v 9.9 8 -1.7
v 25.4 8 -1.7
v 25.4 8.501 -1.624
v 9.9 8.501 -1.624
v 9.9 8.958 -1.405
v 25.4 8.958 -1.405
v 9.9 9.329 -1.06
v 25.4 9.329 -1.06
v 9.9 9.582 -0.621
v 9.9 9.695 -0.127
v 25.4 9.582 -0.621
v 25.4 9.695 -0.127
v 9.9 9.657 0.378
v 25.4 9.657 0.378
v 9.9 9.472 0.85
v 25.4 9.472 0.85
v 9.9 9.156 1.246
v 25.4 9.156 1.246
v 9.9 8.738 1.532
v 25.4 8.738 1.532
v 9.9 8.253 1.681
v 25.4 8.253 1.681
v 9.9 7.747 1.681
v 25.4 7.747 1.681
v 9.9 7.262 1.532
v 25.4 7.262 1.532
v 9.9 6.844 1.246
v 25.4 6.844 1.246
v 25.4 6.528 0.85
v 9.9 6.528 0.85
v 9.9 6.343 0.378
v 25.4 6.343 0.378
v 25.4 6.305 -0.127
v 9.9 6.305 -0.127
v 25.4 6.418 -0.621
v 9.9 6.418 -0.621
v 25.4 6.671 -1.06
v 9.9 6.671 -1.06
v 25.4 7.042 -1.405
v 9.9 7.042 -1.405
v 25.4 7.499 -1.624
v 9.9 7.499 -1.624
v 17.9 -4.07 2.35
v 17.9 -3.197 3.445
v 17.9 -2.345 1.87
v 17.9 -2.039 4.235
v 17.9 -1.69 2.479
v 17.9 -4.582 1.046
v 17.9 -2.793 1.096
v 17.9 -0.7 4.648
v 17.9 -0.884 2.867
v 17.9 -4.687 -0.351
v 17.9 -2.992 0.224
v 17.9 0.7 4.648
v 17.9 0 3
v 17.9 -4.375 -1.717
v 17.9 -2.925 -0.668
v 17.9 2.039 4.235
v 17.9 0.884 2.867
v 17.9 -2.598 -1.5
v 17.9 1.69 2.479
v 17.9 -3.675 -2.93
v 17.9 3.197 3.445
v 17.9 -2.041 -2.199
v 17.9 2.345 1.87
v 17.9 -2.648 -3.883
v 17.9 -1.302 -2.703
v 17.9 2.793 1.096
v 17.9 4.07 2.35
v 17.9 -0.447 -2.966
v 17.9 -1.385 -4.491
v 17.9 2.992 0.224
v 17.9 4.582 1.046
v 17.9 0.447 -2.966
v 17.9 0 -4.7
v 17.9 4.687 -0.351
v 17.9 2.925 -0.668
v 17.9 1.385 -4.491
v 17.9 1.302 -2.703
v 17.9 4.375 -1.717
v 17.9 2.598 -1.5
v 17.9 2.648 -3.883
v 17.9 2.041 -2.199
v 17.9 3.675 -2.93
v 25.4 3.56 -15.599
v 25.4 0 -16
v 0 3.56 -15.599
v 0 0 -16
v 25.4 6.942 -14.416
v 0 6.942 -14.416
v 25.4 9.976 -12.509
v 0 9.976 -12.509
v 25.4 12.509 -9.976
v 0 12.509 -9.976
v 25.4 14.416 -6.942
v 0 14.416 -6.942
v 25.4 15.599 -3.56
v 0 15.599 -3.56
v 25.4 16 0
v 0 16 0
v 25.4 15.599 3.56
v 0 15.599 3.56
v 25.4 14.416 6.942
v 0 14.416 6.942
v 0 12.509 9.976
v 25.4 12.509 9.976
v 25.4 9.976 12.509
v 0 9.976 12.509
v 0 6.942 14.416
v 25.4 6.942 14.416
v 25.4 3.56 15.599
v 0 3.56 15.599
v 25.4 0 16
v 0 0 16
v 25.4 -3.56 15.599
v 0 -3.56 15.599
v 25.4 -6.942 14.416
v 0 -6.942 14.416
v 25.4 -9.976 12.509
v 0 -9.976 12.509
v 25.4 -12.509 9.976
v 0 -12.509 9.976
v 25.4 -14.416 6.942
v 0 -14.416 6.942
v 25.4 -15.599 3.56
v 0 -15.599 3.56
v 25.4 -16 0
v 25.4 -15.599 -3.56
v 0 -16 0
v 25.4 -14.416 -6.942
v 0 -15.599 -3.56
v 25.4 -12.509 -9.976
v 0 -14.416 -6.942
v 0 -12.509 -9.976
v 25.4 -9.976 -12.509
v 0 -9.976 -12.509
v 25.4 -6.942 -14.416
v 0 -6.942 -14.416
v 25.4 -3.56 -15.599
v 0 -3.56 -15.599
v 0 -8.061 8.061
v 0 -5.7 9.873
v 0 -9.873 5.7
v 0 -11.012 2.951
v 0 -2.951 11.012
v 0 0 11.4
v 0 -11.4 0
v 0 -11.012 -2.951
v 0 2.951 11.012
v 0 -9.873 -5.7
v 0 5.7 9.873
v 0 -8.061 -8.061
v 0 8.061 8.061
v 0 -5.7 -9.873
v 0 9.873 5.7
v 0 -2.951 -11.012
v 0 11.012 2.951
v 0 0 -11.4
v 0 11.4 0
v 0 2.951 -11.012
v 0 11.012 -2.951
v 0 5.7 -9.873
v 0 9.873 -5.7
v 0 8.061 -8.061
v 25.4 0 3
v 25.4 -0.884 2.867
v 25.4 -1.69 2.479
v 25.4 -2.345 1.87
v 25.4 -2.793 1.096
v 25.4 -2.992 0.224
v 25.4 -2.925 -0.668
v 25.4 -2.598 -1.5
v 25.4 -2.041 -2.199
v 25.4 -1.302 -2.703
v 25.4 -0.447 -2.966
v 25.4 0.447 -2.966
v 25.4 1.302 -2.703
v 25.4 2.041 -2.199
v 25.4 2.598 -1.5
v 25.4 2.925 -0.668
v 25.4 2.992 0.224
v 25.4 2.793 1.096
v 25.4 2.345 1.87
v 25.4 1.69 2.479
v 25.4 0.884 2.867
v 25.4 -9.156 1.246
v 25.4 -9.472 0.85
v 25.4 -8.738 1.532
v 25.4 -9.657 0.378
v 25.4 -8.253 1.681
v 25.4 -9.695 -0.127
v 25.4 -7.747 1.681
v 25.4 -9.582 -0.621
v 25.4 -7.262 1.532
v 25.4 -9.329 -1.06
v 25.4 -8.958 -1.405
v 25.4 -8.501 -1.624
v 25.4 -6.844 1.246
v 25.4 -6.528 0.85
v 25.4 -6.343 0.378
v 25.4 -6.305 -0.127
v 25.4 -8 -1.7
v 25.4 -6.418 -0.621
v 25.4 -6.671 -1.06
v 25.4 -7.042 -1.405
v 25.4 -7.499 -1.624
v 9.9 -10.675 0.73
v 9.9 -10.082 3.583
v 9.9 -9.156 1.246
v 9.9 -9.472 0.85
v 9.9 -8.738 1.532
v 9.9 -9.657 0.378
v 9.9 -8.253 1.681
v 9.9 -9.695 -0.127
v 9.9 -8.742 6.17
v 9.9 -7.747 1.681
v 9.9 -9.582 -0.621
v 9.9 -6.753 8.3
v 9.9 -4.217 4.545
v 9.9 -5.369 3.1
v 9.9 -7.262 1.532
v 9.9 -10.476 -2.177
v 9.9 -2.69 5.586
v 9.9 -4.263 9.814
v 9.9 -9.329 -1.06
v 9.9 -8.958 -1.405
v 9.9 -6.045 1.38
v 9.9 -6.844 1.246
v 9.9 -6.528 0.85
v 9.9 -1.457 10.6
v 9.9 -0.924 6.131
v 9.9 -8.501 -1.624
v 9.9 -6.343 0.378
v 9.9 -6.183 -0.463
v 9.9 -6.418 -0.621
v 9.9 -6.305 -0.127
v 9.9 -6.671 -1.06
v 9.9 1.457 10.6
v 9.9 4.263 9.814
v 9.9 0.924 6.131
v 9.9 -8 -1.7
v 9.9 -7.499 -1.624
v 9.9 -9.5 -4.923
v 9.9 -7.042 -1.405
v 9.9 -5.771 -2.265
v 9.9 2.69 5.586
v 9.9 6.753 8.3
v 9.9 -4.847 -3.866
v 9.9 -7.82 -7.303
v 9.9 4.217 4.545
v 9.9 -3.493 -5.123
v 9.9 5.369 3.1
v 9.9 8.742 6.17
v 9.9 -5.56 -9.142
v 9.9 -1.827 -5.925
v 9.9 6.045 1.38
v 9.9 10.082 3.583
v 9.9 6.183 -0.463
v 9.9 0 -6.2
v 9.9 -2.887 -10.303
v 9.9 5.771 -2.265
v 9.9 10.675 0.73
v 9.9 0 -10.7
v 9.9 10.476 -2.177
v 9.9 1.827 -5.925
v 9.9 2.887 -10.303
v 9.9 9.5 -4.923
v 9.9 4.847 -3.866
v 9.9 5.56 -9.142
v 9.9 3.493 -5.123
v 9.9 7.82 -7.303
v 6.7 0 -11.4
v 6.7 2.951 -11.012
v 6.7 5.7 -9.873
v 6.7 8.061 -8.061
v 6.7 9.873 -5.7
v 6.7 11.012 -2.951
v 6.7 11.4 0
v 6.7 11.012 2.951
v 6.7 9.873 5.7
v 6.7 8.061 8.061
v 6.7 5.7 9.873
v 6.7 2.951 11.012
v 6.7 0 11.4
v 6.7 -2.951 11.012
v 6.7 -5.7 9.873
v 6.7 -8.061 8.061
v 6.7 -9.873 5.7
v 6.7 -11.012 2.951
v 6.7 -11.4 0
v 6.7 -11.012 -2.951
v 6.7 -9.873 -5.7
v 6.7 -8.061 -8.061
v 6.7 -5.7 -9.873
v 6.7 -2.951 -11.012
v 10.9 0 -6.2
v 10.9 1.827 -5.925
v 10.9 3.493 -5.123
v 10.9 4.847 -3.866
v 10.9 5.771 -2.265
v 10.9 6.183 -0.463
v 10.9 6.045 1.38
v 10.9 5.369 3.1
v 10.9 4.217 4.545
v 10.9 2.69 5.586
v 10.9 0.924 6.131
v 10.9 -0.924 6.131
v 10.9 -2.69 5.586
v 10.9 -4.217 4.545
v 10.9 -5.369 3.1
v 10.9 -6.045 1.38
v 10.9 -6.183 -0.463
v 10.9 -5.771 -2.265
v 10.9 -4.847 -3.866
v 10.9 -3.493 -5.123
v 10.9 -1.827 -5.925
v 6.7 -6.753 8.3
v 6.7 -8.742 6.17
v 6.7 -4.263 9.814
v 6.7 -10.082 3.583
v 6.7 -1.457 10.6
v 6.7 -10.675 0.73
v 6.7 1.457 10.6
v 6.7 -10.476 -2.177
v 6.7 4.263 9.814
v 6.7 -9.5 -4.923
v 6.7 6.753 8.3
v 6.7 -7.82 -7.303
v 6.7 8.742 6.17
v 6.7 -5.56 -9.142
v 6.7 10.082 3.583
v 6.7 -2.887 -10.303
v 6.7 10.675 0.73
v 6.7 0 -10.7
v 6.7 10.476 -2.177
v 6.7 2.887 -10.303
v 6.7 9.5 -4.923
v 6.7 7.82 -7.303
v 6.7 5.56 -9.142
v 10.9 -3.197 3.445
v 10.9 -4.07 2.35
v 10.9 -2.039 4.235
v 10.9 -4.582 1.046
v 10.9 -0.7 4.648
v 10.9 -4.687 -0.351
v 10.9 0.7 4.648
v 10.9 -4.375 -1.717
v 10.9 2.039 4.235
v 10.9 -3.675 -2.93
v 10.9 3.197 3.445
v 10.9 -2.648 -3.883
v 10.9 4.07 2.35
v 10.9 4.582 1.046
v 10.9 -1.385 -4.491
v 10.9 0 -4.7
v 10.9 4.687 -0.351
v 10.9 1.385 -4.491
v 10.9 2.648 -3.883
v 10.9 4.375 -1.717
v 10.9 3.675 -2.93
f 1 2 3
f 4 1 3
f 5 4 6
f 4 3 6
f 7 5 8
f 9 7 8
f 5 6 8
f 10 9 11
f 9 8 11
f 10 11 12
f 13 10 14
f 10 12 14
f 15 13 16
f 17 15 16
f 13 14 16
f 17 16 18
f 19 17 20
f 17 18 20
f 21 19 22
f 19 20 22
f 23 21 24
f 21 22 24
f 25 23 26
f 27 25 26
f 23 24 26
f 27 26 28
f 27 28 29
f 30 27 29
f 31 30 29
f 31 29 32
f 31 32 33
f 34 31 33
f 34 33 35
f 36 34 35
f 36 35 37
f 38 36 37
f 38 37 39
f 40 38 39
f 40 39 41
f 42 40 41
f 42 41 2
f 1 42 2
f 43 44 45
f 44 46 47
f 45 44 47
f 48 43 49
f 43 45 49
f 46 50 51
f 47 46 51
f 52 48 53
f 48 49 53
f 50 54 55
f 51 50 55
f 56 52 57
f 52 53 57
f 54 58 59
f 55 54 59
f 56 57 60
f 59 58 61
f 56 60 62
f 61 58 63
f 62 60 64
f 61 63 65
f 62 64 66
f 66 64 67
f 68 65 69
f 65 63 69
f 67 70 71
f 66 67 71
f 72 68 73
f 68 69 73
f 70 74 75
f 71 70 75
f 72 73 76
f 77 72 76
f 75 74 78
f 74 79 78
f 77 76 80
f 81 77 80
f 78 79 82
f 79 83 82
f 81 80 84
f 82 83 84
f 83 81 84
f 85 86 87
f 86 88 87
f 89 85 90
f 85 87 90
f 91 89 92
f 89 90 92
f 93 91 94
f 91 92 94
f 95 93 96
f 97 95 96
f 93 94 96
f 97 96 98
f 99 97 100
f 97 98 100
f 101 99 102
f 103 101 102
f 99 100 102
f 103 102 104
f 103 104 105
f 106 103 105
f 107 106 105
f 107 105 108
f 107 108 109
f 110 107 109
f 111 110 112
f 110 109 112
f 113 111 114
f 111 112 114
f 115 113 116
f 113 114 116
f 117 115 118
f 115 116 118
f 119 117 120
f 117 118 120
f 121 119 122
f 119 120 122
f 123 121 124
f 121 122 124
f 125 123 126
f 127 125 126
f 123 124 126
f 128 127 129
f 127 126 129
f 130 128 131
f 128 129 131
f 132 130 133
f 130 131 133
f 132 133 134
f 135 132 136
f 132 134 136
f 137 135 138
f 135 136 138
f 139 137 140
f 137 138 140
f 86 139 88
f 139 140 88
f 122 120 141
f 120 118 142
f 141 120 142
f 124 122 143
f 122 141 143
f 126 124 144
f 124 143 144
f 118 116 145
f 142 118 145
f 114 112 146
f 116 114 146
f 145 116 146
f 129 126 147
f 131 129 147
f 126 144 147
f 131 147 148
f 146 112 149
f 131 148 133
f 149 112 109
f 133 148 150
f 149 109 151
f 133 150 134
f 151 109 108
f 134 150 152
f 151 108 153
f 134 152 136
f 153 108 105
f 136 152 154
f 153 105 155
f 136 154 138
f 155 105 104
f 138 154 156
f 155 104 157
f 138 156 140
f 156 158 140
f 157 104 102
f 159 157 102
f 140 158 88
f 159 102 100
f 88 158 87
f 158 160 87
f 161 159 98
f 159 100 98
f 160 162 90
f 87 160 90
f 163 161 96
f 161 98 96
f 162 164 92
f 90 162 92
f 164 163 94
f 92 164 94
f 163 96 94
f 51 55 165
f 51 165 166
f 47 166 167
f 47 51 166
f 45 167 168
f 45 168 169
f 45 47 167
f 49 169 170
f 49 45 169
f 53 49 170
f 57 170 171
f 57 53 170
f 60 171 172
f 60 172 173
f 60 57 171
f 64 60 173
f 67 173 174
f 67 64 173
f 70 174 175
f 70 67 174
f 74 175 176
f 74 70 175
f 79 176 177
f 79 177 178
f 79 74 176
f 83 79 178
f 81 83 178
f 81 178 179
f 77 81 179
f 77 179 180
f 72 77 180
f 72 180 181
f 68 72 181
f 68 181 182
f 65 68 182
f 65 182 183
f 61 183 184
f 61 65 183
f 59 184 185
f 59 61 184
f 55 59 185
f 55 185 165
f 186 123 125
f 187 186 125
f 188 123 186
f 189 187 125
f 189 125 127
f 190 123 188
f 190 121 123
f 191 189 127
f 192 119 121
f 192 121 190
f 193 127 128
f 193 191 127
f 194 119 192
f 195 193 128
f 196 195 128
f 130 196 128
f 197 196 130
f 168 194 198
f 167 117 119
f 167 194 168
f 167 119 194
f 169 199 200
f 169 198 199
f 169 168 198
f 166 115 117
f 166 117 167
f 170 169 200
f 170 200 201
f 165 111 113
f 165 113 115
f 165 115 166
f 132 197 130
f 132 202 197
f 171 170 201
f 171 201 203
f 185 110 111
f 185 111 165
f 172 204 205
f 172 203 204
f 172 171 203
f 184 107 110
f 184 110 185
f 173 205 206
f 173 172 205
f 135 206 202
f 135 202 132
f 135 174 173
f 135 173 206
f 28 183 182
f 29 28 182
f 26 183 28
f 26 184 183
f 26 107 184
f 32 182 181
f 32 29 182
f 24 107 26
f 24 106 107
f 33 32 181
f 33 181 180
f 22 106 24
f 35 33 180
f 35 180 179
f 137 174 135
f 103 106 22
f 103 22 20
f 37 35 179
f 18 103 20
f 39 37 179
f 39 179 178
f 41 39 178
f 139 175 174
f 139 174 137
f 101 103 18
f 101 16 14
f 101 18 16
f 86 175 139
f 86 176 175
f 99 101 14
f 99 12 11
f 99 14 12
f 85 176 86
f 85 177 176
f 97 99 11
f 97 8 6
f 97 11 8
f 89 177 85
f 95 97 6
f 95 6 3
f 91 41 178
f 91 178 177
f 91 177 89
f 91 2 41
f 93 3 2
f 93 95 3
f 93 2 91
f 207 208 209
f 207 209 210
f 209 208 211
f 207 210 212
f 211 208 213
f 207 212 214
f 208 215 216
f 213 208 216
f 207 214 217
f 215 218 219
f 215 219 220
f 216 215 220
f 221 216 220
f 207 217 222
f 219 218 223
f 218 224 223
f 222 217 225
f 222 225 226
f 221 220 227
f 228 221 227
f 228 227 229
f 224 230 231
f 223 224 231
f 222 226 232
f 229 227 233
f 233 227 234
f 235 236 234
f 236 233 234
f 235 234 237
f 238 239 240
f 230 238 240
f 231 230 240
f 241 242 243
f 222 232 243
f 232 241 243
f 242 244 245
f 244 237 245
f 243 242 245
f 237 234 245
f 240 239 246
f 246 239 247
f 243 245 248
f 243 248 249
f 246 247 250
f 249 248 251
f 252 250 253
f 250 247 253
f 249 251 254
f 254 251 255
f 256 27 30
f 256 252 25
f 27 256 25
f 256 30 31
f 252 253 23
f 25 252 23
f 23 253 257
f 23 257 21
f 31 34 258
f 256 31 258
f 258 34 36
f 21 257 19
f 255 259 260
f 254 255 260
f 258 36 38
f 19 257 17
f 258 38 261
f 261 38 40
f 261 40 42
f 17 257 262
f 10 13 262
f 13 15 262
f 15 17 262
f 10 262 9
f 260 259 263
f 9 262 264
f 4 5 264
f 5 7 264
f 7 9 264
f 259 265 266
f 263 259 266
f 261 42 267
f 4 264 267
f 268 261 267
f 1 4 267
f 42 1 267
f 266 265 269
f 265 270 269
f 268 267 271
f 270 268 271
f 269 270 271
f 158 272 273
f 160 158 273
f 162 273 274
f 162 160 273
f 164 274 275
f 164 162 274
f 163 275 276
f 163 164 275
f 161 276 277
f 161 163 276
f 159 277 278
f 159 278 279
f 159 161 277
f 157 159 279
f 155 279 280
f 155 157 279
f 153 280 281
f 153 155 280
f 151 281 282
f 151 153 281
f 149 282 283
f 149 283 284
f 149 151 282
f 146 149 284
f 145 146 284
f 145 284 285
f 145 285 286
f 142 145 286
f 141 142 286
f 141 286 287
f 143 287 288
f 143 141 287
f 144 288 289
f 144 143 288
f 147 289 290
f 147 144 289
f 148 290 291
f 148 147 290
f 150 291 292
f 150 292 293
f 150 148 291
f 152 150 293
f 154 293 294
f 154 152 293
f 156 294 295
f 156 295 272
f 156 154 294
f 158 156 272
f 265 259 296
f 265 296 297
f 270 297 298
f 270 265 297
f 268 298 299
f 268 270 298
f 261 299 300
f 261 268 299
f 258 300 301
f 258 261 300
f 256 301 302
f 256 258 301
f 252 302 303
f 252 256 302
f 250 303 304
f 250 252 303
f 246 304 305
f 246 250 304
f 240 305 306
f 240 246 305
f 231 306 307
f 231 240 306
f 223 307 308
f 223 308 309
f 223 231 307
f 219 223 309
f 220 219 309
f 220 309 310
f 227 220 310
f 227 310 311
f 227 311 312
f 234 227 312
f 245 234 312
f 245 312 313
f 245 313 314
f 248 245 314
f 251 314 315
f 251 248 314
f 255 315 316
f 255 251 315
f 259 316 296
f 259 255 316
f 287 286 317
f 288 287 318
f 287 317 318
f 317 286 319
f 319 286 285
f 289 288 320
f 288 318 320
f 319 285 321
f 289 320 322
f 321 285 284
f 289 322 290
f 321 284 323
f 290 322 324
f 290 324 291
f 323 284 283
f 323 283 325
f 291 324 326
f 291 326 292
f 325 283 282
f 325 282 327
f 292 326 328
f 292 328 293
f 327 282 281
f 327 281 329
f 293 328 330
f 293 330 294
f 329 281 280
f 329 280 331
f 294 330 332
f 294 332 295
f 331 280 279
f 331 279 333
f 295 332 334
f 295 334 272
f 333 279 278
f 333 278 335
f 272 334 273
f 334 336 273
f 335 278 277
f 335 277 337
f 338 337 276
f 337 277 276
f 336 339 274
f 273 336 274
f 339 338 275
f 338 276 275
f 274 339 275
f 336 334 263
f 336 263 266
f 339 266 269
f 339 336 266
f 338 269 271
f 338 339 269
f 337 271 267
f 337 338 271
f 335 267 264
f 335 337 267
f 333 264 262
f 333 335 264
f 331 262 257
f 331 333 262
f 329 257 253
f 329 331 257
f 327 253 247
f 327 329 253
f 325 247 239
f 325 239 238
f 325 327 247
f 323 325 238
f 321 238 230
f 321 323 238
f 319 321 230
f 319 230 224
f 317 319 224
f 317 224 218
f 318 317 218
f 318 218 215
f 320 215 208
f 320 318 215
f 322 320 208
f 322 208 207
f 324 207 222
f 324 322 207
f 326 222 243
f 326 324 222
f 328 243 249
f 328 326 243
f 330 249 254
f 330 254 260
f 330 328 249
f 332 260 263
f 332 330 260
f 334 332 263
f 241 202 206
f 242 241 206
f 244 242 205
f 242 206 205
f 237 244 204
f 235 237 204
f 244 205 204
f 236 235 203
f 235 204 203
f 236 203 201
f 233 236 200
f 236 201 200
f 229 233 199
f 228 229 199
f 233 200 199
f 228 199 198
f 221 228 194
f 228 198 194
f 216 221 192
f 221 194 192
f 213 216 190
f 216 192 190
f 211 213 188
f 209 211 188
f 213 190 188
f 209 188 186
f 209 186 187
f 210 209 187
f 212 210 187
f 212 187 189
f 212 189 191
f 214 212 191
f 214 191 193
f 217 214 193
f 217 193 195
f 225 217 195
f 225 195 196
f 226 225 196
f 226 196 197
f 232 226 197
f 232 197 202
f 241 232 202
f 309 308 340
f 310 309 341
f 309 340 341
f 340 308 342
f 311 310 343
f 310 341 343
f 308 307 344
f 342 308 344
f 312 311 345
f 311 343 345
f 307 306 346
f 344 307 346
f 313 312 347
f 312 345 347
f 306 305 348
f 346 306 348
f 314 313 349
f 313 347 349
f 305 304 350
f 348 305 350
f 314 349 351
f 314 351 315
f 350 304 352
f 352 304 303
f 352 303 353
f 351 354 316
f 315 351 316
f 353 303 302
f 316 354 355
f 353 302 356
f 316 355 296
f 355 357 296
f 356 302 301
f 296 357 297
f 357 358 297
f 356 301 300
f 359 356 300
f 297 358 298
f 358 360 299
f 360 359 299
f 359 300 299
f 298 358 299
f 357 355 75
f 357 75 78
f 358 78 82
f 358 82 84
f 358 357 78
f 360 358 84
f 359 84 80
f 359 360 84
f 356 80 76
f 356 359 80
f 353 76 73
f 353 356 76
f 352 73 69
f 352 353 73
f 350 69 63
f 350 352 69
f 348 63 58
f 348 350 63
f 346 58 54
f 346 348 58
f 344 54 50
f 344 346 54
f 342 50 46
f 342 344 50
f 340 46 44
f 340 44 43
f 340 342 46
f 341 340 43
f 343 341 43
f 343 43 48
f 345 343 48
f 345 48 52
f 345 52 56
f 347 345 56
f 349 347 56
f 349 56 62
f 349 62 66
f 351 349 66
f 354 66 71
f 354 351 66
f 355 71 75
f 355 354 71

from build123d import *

# Parameters (mm, degrees)
SKETCH1_R           = 16
SKETCH1_R_2         = 11.4
BOSS_EXTRUDE1_DEPTH = 6.7
SKETCH2_R           = 16
SKETCH2_R_2         = 10.7
BOSS_EXTRUDE2_DEPTH = 3.2
SKETCH3_R           = 16
SKETCH3_R_2         = 6.2
BOSS_EXTRUDE3_DEPTH = 1
SKETCH4_R           = 16
SKETCH4_R_2         = 4.7
BOSS_EXTRUDE4_DEPTH = 7
SKETCH5_R           = 16
SKETCH5_R_2         = 3
BOSS_EXTRUDE5_DEPTH = 7.5
SKETCH6_R           = 1.7
CUT_EXTRUDE1_DEPTH  = 25.4


with BuildPart() as part:
    # Sketch1 → Boss-Extrude1 (new body)
    with BuildSketch(Plane(origin=(0, 0, 0), x_dir=(0, 0, -1), z_dir=(1, 0, 0))):
        Circle(SKETCH1_R)
        Circle(SKETCH1_R_2, mode=Mode.SUBTRACT)
    extrude(amount=BOSS_EXTRUDE1_DEPTH)

    # Sketch2 → Boss-Extrude2 (add)
    with BuildSketch(Plane(origin=(6.7, 0, 0), x_dir=(0, 0, -1), z_dir=(1, 0, 0))):
        Circle(SKETCH2_R)
        Circle(SKETCH2_R_2, mode=Mode.SUBTRACT)
    extrude(amount=BOSS_EXTRUDE2_DEPTH)

    # Sketch3 → Boss-Extrude3 (add)
    with BuildSketch(Plane(origin=(9.9, 0, 0), x_dir=(0, 0, -1), z_dir=(1, 0, 0))):
        Circle(SKETCH3_R)
        Circle(SKETCH3_R_2, mode=Mode.SUBTRACT)
    extrude(amount=BOSS_EXTRUDE3_DEPTH)

    # Sketch4 → Boss-Extrude4 (add)
    with BuildSketch(Plane(origin=(10.9, 0, 0), x_dir=(0, 0, -1), z_dir=(1, 0, 0))):
        Circle(SKETCH4_R)
        Circle(SKETCH4_R_2, mode=Mode.SUBTRACT)
    extrude(amount=BOSS_EXTRUDE4_DEPTH)

    # Sketch5 → Boss-Extrude5 (add)
    with BuildSketch(Plane(origin=(17.9, 0, 0), x_dir=(0, 0, -1), z_dir=(1, 0, 0))):
        Circle(SKETCH5_R)
        with Locations(Location((0, 0, 0), (0, 0, 180))):
            Circle(SKETCH5_R_2, mode=Mode.SUBTRACT)
    extrude(amount=BOSS_EXTRUDE5_DEPTH)

    # Sketch6 → Cut-Extrude1 (cut)
    with BuildSketch(Plane(origin=(25.4, 0, 0), x_dir=(0, 0, -1), z_dir=(1, 0, 0))):
        with Locations((0, 8)):
            Circle(SKETCH6_R)
        with Locations((0, -8)):
            Circle(SKETCH6_R)
    extrude(amount=-CUT_EXTRUDE1_DEPTH, mode=Mode.SUBTRACT)


solid = part.part
